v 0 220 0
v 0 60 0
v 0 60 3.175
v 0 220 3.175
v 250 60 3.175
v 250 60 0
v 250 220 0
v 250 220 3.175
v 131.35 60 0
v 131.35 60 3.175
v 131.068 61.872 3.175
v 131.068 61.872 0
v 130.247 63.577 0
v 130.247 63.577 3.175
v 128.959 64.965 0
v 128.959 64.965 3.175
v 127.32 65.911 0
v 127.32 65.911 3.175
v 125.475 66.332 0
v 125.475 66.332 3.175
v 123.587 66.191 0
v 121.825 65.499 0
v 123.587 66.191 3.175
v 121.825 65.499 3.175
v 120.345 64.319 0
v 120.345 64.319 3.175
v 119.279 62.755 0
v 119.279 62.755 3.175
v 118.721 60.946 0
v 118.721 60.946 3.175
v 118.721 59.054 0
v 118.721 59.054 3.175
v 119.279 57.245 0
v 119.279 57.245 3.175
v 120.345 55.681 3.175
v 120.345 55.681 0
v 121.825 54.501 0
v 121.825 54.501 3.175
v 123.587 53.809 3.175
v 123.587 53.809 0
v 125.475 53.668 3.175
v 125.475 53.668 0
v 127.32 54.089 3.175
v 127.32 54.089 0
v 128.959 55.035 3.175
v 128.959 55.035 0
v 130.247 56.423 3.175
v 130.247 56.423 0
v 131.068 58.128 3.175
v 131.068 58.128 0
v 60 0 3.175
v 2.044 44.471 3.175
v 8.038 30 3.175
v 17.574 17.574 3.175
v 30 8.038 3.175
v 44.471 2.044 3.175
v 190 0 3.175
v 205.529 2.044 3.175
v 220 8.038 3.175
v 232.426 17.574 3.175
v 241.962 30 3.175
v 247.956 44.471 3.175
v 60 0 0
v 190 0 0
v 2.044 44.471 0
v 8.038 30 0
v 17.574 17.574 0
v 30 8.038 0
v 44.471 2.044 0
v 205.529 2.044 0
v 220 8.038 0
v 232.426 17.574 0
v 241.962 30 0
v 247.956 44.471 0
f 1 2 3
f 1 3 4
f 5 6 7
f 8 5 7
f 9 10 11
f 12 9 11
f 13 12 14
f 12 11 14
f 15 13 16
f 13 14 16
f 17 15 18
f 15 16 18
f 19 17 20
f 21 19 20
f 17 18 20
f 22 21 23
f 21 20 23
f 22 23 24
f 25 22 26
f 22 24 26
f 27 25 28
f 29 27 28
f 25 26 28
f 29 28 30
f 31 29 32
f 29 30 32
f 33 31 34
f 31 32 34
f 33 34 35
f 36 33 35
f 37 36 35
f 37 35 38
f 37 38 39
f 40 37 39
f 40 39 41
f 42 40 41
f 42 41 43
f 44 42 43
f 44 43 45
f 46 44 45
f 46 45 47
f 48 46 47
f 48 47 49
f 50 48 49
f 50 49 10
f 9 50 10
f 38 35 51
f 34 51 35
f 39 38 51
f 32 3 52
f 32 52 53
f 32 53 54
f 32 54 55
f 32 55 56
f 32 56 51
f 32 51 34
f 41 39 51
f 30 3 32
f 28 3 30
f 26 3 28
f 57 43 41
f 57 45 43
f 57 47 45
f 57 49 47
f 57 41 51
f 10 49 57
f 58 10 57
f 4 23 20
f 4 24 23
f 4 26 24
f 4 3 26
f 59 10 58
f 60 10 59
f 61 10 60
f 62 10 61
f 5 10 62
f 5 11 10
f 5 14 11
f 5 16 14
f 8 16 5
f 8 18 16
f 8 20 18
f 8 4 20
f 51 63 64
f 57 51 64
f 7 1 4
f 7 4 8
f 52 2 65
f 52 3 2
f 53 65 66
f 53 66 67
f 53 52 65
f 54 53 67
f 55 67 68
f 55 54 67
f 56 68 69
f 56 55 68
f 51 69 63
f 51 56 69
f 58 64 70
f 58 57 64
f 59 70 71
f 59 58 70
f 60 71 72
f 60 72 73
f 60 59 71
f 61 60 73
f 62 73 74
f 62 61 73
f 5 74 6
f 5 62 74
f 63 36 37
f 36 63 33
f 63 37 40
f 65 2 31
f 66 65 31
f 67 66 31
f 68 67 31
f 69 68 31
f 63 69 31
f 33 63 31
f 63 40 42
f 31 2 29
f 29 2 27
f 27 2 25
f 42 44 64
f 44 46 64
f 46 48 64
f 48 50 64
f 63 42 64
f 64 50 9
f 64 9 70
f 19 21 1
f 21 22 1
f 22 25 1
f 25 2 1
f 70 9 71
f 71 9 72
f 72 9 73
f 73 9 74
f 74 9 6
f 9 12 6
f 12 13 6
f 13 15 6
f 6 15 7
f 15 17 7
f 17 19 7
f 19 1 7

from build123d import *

# Parameters (mm, degrees)
CROQUIS1_W              = 250
CROQUIS1_H              = 220
SALIENTE_EXTRUIR1_DEPTH = 3.175
REDONDEO1_R             = 60
CROQUIS2_R              = 6.35
CORTAR_EXTRUIR1_DEPTH   = 6.35


with BuildPart() as part:
    # Croquis1 → Saliente-Extruir1 (new body)
    with BuildSketch(Plane.XY):
        with Locations((125, 110)):
            Rectangle(CROQUIS1_W, CROQUIS1_H)
    extrude(amount=SALIENTE_EXTRUIR1_DEPTH)

    # Redondeo1
    redondeo1_edges = [part.edges().sort_by_distance(p)[0] for p in [
        (250, 0, 1.5875),
        (0, 0, 1.5875),
    ]]
    fillet(redondeo1_edges, radius=REDONDEO1_R)

    # Croquis2 → Cortar-Extruir1 (cut)
    with BuildSketch(Plane.XY.offset(3.175)):
        with Locations((125, 60)):
            Circle(CROQUIS2_R)
    extrude(amount=-CORTAR_EXTRUIR1_DEPTH, mode=Mode.SUBTRACT)


solid = part.part
